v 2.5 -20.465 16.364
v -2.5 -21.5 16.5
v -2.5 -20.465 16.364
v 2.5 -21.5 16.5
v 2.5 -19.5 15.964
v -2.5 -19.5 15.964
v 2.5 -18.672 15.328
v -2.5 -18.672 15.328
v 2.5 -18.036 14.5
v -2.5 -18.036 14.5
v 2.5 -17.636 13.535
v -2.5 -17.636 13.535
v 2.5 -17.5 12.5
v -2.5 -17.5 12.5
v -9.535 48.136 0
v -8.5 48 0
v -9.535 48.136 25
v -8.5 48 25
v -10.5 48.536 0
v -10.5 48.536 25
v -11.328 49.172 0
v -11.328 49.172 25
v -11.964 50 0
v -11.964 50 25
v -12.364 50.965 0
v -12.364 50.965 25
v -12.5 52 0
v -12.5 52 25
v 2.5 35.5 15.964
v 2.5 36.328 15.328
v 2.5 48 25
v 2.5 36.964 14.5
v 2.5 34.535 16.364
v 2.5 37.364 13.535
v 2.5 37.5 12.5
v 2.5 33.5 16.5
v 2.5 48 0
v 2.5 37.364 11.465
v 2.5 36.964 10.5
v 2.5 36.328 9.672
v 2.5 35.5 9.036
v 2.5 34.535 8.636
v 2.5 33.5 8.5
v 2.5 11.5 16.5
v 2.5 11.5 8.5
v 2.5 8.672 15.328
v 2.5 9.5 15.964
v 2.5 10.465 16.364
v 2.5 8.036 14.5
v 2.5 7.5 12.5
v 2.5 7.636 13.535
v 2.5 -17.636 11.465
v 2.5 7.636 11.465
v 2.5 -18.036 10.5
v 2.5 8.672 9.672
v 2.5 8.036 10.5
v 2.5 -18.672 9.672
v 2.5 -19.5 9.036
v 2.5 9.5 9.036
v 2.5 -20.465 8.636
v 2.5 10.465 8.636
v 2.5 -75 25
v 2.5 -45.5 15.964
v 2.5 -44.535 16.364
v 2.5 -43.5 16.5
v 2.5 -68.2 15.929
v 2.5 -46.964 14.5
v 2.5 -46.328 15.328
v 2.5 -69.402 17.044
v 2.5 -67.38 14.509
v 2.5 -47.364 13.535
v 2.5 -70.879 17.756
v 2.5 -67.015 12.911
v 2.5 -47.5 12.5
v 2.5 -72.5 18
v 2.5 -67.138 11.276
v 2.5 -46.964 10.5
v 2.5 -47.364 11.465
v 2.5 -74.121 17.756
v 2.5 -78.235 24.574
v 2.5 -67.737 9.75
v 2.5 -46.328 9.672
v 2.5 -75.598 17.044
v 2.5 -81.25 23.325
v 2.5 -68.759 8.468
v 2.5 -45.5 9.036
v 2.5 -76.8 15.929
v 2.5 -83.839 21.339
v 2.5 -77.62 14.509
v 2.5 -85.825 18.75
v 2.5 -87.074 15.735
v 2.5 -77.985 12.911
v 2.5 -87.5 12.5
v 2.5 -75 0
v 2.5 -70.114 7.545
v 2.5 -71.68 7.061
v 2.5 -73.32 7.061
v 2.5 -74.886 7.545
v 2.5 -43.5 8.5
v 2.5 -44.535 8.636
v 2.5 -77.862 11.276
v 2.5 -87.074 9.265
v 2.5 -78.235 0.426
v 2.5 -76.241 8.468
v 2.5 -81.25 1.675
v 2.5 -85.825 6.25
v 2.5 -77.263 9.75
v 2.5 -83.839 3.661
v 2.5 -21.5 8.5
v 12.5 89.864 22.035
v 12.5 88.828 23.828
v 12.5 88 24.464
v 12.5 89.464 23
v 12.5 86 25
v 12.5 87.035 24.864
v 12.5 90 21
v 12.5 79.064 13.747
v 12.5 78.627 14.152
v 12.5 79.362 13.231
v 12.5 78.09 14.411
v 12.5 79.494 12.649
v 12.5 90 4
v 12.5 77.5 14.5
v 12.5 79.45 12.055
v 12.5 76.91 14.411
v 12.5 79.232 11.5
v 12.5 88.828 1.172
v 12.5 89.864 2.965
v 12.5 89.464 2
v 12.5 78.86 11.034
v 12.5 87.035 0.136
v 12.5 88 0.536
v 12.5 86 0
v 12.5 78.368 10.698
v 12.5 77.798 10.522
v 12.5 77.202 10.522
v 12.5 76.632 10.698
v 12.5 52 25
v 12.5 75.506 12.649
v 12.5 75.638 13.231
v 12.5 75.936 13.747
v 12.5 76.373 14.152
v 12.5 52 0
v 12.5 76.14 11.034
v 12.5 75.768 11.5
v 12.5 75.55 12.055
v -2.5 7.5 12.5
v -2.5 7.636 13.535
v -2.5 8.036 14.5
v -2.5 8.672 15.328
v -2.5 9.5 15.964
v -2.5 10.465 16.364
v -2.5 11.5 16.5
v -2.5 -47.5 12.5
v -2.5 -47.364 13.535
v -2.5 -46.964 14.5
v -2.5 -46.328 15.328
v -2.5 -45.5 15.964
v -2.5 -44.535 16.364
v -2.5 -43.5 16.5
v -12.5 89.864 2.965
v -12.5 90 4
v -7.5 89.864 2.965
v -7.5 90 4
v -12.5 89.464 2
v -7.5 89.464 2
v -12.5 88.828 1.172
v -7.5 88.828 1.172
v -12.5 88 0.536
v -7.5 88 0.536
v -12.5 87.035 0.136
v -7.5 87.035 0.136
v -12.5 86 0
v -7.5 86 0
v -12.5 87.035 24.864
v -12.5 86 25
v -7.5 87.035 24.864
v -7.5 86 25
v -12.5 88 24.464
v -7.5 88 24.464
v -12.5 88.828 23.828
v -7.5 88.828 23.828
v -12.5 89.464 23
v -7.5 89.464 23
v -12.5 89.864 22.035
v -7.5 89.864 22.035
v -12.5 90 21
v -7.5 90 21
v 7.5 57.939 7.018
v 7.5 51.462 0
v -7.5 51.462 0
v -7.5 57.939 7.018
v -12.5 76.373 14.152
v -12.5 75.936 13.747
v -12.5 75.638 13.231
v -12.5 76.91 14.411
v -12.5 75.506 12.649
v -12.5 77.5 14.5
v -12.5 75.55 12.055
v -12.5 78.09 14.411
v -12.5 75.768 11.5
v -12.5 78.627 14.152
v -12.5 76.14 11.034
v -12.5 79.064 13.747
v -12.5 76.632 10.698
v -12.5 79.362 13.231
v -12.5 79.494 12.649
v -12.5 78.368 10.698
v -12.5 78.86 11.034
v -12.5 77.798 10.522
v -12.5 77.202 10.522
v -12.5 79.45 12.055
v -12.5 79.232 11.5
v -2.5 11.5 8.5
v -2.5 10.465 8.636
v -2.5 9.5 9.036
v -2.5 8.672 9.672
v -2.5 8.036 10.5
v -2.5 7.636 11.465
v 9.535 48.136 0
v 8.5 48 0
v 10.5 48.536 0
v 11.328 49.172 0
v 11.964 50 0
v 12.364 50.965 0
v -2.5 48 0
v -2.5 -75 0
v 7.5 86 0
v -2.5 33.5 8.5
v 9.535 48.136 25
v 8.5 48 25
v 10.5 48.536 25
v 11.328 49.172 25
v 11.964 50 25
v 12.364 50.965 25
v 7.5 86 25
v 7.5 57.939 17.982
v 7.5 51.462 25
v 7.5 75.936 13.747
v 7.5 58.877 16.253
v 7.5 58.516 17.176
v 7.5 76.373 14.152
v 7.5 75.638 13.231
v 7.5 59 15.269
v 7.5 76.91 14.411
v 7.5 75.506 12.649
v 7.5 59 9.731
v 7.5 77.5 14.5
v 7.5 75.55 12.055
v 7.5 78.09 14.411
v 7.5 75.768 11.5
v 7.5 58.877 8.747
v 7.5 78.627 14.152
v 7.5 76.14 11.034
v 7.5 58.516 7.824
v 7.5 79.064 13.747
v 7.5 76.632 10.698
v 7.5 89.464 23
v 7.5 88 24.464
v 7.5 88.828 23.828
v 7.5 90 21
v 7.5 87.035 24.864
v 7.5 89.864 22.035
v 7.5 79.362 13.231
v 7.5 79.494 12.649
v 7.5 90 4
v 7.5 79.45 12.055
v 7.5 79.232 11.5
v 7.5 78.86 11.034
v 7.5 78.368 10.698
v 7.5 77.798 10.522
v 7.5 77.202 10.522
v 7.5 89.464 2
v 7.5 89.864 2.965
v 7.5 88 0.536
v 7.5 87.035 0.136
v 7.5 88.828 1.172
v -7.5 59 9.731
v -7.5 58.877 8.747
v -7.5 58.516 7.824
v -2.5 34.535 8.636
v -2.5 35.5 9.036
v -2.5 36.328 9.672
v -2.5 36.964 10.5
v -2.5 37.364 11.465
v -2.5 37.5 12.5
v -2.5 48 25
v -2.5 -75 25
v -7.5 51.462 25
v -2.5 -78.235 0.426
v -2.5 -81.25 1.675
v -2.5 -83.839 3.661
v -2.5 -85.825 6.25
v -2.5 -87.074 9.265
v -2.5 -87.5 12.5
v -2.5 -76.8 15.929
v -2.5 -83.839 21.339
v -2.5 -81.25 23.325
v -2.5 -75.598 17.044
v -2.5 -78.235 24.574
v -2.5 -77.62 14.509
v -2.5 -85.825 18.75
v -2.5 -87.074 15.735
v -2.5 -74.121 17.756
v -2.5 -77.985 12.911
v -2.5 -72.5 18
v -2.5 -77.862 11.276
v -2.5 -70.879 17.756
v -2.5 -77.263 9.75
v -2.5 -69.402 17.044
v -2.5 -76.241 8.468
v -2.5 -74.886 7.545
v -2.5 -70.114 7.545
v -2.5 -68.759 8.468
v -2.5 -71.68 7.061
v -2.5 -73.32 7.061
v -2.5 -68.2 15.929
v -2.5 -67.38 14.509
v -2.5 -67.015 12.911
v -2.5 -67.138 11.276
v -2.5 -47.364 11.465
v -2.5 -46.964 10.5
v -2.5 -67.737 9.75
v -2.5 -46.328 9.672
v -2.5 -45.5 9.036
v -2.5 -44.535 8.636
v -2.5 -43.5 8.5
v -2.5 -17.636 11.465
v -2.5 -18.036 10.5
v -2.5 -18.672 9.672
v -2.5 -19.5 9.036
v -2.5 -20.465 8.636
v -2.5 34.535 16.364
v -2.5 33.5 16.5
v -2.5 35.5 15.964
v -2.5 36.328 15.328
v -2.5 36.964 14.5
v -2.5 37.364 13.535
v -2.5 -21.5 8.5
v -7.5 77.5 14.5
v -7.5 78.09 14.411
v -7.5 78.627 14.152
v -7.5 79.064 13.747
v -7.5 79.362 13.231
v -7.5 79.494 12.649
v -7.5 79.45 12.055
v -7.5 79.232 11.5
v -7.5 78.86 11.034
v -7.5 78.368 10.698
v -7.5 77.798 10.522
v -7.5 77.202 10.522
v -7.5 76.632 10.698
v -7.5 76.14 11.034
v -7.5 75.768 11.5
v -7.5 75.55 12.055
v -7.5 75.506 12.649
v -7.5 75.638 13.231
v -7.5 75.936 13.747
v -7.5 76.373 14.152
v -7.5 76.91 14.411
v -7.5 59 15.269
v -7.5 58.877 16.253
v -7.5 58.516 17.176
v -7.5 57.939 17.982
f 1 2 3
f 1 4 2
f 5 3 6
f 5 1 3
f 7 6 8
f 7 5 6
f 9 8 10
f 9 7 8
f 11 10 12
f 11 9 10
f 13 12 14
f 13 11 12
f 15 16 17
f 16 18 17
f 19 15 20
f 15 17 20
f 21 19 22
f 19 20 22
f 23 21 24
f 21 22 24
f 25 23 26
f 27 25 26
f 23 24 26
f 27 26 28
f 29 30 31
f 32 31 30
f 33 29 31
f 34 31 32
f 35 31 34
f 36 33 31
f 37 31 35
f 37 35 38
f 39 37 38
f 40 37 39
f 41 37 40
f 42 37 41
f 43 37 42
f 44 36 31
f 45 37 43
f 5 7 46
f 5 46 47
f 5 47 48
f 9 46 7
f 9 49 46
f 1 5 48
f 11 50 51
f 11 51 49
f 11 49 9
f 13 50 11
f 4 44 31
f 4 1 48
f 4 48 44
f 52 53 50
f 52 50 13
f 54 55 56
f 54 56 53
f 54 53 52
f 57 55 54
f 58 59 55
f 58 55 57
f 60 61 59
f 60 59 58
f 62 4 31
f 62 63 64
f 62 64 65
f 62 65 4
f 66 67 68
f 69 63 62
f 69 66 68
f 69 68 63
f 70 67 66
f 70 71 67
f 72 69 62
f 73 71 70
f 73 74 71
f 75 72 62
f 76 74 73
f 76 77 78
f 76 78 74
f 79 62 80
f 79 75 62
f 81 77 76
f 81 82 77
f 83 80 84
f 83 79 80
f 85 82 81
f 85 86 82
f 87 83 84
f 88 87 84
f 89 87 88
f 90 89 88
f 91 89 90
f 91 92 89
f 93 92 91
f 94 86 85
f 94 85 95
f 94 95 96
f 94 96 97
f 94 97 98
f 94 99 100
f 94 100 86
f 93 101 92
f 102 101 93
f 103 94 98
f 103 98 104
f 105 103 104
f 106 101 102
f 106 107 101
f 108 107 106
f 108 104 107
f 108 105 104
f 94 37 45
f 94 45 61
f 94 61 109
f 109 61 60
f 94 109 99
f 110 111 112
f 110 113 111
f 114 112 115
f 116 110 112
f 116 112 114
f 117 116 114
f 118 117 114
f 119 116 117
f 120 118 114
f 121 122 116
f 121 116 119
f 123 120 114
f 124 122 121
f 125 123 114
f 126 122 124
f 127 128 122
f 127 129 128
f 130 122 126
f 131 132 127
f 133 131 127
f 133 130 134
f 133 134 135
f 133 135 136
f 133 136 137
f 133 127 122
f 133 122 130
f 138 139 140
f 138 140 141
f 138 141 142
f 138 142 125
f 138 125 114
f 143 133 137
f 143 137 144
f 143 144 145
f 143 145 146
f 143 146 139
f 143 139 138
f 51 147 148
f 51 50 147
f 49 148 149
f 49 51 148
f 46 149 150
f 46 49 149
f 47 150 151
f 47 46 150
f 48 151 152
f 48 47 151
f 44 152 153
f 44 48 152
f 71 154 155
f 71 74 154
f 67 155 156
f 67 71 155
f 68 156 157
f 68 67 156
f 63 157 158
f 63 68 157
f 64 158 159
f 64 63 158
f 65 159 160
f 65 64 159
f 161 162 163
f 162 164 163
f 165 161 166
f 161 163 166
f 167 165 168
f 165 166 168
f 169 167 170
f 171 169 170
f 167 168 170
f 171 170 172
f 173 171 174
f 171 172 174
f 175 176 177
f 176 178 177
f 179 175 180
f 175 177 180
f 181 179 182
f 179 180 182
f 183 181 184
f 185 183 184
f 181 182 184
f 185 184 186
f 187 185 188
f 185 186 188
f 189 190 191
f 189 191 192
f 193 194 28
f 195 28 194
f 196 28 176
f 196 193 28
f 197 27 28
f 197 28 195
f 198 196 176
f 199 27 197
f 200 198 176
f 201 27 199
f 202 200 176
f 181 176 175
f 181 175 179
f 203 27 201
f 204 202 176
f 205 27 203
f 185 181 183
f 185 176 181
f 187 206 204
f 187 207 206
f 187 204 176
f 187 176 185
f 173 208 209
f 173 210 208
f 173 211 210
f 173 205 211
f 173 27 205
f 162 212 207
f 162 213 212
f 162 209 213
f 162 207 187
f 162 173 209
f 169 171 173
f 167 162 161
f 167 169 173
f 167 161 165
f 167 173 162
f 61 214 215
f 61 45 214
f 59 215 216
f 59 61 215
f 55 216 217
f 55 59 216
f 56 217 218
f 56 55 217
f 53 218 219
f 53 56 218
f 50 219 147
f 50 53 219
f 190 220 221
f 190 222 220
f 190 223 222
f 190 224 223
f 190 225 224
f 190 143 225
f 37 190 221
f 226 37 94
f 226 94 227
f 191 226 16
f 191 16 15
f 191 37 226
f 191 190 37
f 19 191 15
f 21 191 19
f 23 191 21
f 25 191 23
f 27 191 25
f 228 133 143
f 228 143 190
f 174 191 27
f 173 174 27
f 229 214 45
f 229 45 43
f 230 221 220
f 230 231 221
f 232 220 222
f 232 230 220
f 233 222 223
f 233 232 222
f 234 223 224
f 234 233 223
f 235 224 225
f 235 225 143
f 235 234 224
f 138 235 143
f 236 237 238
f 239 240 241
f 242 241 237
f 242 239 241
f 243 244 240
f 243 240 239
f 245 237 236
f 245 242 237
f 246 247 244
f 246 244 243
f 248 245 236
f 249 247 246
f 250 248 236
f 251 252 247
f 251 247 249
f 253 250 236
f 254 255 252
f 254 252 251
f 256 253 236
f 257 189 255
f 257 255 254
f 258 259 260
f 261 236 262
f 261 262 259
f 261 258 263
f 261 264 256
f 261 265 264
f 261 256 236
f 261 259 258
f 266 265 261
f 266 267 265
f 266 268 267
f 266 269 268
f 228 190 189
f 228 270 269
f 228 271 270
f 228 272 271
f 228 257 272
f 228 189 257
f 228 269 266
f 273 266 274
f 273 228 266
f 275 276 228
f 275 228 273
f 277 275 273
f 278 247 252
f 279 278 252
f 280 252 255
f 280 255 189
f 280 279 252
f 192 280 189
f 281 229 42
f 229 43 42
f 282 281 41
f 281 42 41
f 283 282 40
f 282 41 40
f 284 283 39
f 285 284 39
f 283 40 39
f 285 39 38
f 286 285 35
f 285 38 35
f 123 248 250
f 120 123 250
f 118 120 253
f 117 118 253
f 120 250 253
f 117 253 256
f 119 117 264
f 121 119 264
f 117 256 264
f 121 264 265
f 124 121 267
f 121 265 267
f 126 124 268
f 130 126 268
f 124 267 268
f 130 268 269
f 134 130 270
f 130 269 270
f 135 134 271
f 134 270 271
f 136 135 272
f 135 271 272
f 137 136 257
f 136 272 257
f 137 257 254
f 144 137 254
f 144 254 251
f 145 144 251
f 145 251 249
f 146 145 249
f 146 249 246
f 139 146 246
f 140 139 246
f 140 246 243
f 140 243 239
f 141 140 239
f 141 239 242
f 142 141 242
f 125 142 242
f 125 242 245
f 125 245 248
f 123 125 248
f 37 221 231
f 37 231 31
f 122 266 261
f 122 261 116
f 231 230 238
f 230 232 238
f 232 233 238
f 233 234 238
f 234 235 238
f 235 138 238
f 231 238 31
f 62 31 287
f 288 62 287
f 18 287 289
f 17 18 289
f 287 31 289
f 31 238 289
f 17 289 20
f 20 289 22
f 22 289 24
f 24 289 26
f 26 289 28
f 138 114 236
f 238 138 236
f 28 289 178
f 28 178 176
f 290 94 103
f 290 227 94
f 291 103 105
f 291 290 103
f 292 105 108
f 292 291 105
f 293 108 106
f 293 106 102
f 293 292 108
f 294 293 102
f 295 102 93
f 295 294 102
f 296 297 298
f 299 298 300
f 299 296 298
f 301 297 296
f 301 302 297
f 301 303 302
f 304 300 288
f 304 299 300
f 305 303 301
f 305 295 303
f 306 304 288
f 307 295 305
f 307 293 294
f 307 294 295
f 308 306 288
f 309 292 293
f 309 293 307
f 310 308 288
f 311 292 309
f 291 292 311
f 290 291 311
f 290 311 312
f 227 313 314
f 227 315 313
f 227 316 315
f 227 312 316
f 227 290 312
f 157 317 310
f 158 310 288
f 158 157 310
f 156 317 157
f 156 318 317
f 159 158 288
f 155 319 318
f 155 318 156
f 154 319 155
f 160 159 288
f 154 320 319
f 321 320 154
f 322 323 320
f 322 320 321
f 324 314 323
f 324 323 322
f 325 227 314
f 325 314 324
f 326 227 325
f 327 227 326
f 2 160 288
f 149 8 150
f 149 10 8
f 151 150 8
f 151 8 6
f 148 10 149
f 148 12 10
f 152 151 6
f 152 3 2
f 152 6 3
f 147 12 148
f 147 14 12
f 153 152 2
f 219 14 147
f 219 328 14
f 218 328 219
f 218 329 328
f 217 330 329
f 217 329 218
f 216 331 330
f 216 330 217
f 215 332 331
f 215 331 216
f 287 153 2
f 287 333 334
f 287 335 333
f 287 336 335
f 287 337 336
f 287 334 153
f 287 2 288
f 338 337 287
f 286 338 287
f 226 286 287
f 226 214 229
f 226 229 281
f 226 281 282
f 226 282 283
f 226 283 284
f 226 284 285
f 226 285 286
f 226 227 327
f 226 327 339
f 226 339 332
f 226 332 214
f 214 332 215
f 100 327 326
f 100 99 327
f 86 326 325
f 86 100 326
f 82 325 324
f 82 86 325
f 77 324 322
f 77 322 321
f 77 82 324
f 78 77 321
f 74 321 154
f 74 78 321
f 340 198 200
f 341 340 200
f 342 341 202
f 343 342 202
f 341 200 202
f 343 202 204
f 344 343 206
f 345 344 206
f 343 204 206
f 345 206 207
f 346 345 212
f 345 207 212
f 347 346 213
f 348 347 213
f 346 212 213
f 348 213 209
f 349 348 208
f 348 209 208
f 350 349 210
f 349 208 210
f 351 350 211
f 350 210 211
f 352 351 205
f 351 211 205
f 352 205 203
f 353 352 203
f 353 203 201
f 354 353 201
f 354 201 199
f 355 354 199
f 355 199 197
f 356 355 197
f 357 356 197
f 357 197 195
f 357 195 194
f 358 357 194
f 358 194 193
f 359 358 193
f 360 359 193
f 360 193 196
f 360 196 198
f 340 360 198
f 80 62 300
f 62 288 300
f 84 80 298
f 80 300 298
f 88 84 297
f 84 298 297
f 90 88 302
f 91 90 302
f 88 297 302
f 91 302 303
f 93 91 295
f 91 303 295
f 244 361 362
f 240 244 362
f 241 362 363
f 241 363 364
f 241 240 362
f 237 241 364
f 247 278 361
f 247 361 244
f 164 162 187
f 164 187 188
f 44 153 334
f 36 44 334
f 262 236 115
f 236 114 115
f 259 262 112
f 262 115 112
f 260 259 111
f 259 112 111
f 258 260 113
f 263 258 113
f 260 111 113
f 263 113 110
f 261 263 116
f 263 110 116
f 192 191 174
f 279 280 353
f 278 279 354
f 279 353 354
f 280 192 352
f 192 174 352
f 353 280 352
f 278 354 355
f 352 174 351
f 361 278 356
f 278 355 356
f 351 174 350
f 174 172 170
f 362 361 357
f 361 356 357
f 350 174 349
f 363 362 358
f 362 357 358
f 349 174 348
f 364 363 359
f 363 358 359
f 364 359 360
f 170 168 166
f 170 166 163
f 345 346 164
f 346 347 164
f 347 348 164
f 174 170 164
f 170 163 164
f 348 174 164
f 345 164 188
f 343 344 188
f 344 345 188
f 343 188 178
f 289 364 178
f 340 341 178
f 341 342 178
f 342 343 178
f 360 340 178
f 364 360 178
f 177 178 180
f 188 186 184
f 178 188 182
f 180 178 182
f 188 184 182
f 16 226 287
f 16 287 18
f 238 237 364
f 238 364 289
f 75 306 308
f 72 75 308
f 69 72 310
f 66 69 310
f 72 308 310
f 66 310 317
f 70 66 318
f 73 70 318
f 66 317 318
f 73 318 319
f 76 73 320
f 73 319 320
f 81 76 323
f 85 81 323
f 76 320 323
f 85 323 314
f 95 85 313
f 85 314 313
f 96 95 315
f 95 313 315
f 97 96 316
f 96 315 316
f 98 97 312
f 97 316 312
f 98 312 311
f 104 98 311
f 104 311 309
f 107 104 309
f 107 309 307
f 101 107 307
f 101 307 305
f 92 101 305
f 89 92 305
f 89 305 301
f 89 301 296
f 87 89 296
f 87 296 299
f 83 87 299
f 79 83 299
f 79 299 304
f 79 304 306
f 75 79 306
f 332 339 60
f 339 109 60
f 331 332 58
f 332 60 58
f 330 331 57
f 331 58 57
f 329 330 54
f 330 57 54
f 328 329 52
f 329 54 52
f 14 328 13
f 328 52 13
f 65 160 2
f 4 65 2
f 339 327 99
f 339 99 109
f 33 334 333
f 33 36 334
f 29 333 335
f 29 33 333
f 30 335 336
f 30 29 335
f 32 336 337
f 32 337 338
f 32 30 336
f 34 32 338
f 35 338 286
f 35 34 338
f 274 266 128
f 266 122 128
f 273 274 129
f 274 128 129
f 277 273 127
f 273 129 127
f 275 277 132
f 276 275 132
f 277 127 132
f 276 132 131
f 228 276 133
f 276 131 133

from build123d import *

# Parameters (mm, degrees)
Y_KSEKLIK_EKSTR_ZYON1_DEPTH = 25
IZIM2_R                     = 2
KES_EKSTR_ZYON1_DEPTH       = 25
IZIM3_R                     = 5.5
IZIM3_W                     = 8
IZIM3_H                     = 30
KES_EKSTR_ZYON2_DEPTH       = 10
CUT_EXTRUDE8_DEPTH          = 7.5
RADYUS1_R                   = 4
FILLET1_R                   = 12.5


with BuildPart() as part:
    # Çizim1 → Yükseklik-Ekstrüzyon1 (new body)
    with BuildSketch(Plane.XY):
        Polygon((-2.5, 48), (-12.5, 48), (-12.5, 90), (-7.5, 90), (-7.5, 59), (7.5, 59), (7.5, 90), (12.5, 90), (12.5, 48), (2.5, 48), (2.5, -87.5), (-2.5, -87.5), align=None)
    extrude(amount=Y_KSEKLIK_EKSTR_ZYON1_DEPTH)

    # Çizim2 → Kes-Ekstrüzyon1 (cut)
    with BuildSketch(Plane.ZY.offset(12.5)):
        with Locations((12.5, 77.5)):
            Circle(IZIM2_R)
    extrude(amount=-KES_EKSTR_ZYON1_DEPTH, mode=Mode.SUBTRACT)

    # Çizim3 → Kes-Ekstrüzyon2 (cut)
    with BuildSketch(Plane.ZY.offset(2.5)):
        with Locations((12.5, -72.5)):
            Circle(IZIM3_R)
        with Locations((12.5, 22.5)):
            Rectangle(IZIM3_W, IZIM3_H)
        with Locations((12.5, -32.5)):
            Rectangle(IZIM3_W, IZIM3_H)
    extrude(amount=-KES_EKSTR_ZYON2_DEPTH, mode=Mode.SUBTRACT)

    # Sketch2 → Cut-Extrude8 (cut, symmetric)
    with BuildSketch(Plane(origin=(0, 0, 0), x_dir=(0, 0, -1), z_dir=(1, 0, 0))):
        Polygon((-12.5, 63), (-25.5, 51), (-25.5, 65), (0.5, 65), (0.5, 51), align=None)
    extrude(amount=CUT_EXTRUDE8_DEPTH, both=True, mode=Mode.SUBTRACT)

    # Radyus1
    radyus1_edges = [part.edges().sort_by_distance(p)[0] for p in [
        (-10, 90, 25),
        (10, 90, 25),
        (10, 90, 0),
        (-10, 90, 0),
        (0, 7.5, 16.5),
        (0, 37.5, 16.5),
        (0, 7.5, 8.5),
        (0, 37.5, 8.5),
        (0, -47.5, 16.5),
        (0, -47.5, 8.5),
        (0, -17.5, 16.5),
        (0, -17.5, 8.5),
        (0, 59, 16.833333333),
        (0, 59, 8.166666667),
        (12.5, 48, 12.5),
        (-12.5, 48, 12.5),
    ]]
    fillet(radyus1_edges, radius=RADYUS1_R - 0.0001)  # a hair under: the kernel refuses the full size

    # Fillet1
    fillet1_edges = [part.edges().sort_by_distance(p)[0] for p in [
        (0, -87.5, 0),
        (0, -87.5, 25),
    ]]
    fillet(fillet1_edges, radius=FILLET1_R - 0.0001)  # a hair under: the kernel refuses the full size


solid = part.part
